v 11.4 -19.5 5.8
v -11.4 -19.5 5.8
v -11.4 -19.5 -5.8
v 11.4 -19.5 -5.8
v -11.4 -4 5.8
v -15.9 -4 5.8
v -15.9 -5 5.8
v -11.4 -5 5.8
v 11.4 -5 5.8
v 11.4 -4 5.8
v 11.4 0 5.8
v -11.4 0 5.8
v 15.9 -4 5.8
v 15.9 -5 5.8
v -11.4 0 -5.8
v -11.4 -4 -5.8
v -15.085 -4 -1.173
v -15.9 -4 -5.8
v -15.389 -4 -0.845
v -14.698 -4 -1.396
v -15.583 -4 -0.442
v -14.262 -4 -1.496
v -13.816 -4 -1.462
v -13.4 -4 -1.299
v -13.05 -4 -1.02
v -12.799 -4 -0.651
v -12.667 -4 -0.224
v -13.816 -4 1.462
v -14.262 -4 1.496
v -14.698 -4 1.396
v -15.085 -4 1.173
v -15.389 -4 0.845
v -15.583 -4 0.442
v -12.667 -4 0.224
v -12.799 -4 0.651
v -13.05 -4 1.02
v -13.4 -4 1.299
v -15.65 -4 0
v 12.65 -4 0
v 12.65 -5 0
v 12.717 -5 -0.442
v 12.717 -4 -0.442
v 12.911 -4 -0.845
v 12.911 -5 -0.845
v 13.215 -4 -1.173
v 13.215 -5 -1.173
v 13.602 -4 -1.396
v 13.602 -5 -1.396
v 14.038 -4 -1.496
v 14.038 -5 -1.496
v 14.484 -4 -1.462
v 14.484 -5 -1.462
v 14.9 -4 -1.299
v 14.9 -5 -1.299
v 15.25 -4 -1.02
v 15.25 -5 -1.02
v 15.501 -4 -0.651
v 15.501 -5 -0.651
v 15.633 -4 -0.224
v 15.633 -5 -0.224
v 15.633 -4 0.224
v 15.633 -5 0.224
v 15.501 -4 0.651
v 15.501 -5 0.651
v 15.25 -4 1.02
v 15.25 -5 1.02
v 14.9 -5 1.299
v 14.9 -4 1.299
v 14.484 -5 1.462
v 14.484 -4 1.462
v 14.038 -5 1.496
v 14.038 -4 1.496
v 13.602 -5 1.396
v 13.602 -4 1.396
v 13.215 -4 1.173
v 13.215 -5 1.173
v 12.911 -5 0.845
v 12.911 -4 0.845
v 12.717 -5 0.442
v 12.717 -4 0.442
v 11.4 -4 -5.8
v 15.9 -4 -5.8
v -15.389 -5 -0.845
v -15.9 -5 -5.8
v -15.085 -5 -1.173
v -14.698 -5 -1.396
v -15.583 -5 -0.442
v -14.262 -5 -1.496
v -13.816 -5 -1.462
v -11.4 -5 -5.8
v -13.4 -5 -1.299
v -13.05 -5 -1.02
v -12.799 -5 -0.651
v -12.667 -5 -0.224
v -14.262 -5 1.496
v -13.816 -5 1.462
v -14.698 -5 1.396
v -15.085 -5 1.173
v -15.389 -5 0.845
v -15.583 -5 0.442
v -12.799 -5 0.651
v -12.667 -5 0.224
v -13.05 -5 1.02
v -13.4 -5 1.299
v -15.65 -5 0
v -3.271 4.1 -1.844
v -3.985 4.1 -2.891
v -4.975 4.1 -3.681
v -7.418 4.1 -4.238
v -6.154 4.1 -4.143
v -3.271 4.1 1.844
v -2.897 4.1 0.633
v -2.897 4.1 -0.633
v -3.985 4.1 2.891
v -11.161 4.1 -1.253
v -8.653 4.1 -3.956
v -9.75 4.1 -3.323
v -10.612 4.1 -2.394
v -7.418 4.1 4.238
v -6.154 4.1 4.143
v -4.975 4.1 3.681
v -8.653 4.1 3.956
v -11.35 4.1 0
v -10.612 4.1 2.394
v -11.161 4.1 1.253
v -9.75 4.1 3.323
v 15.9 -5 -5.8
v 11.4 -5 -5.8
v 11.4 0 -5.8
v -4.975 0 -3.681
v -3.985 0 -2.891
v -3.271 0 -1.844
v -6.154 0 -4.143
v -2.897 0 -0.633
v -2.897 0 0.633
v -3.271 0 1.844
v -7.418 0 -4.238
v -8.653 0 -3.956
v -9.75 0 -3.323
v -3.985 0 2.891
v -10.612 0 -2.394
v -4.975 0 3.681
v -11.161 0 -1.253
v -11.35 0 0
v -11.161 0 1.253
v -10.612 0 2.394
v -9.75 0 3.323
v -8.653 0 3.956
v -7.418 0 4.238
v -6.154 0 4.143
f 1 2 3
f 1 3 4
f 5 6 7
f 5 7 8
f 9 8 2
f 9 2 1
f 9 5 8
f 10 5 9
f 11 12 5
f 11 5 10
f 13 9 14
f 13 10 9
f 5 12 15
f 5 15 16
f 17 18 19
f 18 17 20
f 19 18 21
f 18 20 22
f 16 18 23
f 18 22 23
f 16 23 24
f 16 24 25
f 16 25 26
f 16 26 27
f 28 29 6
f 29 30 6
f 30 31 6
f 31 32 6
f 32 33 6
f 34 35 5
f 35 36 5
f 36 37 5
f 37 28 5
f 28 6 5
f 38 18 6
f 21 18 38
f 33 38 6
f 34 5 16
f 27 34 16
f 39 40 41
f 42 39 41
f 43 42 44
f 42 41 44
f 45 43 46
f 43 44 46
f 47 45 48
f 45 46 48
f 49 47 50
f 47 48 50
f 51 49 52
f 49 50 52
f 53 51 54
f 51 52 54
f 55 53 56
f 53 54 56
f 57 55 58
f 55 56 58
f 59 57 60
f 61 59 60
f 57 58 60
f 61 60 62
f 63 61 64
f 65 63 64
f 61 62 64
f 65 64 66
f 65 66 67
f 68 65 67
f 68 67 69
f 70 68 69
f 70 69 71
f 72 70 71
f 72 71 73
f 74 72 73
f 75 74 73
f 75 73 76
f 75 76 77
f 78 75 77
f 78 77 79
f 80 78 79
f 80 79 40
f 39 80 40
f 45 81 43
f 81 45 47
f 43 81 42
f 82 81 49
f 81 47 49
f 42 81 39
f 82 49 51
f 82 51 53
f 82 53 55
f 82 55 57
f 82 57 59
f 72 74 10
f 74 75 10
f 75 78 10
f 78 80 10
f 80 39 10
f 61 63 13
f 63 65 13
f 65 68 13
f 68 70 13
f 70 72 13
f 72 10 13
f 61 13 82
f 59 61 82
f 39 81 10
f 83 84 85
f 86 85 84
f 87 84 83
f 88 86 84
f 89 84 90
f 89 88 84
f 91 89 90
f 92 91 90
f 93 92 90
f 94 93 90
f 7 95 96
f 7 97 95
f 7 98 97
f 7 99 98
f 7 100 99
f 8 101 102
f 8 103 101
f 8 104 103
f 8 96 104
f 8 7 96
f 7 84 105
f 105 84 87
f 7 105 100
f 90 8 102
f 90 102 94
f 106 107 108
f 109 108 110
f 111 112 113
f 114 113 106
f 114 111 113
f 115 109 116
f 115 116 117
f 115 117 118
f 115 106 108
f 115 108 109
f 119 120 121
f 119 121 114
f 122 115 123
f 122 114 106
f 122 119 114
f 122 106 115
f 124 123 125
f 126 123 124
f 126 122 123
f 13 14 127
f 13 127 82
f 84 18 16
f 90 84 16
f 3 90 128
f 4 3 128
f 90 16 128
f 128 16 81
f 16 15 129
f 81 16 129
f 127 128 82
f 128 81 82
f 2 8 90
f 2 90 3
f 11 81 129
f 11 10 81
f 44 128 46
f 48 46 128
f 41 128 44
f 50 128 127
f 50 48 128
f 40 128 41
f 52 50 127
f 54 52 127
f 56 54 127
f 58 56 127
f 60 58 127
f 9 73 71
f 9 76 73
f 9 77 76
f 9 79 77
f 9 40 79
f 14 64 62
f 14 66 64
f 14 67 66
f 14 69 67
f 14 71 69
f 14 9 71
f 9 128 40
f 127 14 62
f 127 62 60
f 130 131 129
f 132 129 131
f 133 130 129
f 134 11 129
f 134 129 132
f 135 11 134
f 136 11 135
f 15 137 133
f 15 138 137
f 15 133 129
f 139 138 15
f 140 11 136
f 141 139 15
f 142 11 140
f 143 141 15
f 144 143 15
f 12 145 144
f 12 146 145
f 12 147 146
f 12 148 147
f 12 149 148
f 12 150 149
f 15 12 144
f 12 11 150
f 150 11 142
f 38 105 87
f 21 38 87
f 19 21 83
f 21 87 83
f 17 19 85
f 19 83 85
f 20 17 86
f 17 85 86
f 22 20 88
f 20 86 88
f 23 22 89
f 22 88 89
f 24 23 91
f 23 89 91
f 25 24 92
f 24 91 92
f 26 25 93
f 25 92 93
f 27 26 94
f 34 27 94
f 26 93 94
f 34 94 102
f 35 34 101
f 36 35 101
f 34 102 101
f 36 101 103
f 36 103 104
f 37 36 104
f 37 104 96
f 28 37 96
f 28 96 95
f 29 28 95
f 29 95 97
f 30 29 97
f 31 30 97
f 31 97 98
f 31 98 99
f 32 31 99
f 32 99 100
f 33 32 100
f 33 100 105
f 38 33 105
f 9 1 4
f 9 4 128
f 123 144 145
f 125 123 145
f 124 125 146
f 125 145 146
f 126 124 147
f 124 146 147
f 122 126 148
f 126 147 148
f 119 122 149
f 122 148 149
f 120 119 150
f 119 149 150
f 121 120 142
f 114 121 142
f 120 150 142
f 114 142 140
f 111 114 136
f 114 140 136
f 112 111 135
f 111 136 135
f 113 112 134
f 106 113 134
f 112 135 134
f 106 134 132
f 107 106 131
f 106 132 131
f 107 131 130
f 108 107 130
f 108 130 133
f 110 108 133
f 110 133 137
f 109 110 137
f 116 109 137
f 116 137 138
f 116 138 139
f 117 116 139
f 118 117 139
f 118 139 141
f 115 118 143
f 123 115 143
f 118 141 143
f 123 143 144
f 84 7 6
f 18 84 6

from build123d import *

# Parameters (mm, degrees)
F0_W     = 4.5
F0_H     = 1
F1_DEPTH = 5.8
F2_R     = 4.25
F3_DEPTH = 4.1
F5_D     = 3


with BuildPart() as f1:
    # F0 (on Top) → F1 (new body, symmetric)
    with BuildSketch(Plane.XY):
        Polygon((11.4, 0), (-11.4, 0), (-11.4, -4), (-11.4, -5), (-11.4, -19.5), (11.4, -19.5), (11.4, -5), (11.4, -4), align=None)
        with Locations((-13.65, -4.5)):
            Rectangle(F0_W, F0_H)
        with Locations((13.65, -4.5)):
            Rectangle(F0_W, F0_H)
    extrude(amount=F1_DEPTH, both=True)

    # F2 (on face) → F3 (join)
    with BuildSketch(Plane(origin=(0, 0, 0), x_dir=(-1, 0, 0), z_dir=(0, 1, 0))):
        with Locations((7.1, 0)):
            Circle(F2_R)
    extrude(amount=F3_DEPTH)

    # F5 (through all)
    with Locations(Plane(origin=(0, 0, 0), x_dir=(1, 0, 0), z_dir=(0, 1, 0))):
        with Locations((14.15, 0), (-14.15, 0)):
            Hole(F5_D / 2)


solid = f1.part
